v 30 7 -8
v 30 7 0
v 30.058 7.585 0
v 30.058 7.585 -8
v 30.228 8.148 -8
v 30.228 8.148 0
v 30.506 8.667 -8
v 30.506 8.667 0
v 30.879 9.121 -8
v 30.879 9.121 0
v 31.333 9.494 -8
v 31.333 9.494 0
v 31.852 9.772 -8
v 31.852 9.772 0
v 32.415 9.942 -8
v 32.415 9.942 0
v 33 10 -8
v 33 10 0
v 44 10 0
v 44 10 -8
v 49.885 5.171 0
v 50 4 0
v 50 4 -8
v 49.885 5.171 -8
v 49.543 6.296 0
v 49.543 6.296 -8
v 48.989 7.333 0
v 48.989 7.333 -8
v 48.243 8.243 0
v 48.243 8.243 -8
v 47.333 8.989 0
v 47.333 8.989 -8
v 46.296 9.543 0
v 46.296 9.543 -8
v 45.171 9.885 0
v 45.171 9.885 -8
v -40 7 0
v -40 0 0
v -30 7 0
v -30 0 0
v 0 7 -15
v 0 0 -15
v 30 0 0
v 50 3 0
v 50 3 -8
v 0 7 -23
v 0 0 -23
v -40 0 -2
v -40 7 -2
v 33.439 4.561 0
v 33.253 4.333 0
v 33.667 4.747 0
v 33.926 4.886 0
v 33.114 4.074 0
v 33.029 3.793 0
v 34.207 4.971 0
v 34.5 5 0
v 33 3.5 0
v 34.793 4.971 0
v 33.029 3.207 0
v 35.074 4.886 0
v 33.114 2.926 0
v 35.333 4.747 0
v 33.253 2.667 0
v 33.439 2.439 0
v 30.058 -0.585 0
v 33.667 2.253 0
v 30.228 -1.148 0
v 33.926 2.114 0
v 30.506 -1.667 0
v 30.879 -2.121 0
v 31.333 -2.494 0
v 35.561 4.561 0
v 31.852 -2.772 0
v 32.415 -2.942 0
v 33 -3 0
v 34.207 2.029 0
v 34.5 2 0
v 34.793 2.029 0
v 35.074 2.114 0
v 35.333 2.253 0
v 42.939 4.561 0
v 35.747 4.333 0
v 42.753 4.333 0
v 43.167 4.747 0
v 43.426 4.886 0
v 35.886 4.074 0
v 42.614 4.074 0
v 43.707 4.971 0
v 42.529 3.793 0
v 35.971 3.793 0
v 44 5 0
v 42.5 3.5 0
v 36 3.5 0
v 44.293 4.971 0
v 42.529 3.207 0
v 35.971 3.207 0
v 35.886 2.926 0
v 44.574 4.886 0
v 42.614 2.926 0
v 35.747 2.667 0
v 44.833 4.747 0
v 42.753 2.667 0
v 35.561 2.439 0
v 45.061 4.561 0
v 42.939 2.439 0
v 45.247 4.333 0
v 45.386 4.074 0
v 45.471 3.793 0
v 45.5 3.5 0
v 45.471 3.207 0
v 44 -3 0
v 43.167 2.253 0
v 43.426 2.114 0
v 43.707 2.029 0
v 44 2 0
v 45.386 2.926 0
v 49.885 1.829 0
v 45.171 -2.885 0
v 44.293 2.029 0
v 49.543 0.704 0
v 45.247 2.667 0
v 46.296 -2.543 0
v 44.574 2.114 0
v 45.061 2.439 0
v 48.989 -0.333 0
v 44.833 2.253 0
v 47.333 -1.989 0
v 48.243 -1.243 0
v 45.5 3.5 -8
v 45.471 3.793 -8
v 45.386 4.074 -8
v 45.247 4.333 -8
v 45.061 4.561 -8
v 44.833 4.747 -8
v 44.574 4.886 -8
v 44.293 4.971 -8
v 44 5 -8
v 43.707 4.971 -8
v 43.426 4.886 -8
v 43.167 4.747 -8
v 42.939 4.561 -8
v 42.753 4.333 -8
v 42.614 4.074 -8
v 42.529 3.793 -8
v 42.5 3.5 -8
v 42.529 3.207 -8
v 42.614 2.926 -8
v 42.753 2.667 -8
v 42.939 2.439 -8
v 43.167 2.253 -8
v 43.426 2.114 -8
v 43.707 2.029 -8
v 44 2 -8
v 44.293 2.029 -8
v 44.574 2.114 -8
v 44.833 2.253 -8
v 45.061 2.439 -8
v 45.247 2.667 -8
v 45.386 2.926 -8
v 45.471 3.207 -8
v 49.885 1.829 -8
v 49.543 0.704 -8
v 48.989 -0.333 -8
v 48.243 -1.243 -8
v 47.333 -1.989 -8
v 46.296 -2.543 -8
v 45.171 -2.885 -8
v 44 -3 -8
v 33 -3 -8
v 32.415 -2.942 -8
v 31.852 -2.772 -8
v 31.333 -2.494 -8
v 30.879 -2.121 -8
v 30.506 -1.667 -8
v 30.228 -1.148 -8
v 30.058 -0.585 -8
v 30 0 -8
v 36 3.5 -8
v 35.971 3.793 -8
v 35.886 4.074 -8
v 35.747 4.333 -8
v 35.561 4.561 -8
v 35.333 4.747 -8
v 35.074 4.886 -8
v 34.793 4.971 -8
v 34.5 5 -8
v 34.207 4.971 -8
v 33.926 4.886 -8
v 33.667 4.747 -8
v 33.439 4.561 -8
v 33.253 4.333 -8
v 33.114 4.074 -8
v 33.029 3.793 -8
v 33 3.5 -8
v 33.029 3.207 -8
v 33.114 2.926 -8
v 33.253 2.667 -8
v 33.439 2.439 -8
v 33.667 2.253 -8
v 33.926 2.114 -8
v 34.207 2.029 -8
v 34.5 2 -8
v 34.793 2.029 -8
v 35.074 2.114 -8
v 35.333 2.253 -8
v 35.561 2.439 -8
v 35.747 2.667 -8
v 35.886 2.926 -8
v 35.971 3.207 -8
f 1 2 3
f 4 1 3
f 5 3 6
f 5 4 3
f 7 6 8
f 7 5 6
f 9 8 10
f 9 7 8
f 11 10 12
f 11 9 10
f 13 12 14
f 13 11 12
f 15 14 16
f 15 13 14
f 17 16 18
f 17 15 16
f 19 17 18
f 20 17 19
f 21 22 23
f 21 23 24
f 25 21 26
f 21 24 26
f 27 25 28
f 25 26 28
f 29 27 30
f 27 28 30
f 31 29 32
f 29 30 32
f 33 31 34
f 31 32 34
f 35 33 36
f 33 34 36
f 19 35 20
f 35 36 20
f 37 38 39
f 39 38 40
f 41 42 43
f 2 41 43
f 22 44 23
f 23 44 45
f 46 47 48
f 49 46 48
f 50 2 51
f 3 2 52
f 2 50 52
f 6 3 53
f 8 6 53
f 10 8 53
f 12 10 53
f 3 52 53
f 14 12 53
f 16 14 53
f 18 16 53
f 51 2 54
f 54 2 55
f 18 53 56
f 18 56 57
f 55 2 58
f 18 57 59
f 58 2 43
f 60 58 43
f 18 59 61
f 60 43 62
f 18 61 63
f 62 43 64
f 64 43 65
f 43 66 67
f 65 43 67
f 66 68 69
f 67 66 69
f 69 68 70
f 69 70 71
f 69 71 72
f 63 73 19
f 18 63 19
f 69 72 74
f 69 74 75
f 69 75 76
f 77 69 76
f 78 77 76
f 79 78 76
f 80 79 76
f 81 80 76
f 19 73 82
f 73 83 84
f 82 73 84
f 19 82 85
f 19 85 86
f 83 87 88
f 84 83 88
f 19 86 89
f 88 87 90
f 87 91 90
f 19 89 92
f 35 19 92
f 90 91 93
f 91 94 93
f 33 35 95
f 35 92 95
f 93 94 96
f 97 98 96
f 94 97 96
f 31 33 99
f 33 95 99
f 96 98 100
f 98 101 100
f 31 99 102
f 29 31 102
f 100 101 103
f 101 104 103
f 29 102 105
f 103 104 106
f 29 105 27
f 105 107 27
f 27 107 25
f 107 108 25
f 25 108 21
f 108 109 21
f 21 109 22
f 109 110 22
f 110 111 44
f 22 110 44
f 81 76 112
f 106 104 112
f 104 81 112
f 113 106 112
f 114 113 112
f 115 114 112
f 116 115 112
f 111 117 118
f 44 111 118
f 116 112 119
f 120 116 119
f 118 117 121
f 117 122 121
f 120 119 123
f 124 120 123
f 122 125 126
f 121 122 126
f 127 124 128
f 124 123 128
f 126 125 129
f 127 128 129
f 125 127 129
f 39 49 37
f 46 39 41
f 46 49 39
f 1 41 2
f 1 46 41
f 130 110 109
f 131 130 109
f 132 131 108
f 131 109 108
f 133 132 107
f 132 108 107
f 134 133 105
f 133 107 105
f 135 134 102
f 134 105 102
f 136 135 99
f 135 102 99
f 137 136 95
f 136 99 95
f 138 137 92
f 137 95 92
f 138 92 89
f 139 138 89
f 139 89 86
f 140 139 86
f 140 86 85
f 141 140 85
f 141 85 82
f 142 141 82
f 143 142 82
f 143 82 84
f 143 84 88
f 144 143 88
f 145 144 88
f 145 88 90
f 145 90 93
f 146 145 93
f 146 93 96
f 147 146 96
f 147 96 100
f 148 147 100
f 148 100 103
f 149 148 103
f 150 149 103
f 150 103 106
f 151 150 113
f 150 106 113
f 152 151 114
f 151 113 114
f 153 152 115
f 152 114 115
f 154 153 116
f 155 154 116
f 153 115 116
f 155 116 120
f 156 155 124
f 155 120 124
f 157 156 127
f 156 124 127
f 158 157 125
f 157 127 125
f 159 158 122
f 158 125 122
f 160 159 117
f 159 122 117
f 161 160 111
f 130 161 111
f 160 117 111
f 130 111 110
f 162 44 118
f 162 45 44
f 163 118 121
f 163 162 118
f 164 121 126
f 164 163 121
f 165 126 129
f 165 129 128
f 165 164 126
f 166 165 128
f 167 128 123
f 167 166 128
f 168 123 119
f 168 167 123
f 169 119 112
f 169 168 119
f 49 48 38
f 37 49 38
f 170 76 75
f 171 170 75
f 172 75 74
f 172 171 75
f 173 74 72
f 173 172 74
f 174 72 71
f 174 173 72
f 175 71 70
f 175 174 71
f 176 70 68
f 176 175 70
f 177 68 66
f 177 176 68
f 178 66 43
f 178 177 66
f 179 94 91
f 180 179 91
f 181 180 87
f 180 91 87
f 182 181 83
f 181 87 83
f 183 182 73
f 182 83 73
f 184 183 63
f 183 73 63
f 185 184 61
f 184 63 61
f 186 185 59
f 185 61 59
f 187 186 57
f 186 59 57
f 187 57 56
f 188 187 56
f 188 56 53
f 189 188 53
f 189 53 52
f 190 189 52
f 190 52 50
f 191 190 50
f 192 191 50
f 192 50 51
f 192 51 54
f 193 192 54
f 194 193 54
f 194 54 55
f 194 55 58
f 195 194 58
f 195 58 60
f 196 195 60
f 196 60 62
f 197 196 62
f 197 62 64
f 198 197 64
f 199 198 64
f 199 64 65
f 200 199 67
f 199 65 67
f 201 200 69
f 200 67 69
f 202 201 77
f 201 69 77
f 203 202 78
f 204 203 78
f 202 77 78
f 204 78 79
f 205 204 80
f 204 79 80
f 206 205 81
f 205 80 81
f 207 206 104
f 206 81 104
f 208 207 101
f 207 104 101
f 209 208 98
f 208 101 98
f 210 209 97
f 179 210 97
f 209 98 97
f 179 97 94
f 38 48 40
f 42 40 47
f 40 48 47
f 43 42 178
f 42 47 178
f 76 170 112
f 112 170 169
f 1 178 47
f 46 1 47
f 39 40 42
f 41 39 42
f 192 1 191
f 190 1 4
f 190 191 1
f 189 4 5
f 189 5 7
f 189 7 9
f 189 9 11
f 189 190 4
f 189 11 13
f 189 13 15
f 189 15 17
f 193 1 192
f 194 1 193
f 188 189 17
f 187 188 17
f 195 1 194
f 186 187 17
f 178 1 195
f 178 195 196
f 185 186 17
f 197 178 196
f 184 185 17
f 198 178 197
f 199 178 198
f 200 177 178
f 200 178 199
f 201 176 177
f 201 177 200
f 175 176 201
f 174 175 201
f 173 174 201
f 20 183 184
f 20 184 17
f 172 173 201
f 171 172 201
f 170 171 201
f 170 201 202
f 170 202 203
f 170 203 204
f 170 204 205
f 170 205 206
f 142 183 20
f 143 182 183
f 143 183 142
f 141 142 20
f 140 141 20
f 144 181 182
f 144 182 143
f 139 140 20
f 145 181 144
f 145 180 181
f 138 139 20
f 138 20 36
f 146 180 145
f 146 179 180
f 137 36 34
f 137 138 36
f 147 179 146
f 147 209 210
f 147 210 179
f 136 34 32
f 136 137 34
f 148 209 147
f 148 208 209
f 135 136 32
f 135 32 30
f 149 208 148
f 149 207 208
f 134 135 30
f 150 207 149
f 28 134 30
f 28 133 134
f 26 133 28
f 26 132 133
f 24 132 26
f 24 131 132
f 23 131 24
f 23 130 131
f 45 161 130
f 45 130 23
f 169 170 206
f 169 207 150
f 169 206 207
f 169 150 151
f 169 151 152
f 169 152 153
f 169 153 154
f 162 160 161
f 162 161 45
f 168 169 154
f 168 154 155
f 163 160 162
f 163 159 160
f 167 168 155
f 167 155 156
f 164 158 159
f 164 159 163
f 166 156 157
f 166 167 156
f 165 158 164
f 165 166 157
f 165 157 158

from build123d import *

# Parameters (mm, degrees)
BOSS_EXTRUDE1_DEPTH      = 7
BOSS_EXTRUDE2_DEPTH      = 3
BOSS_EXTRUDE2_DEPTH_BACK = 10
SKETCH2_W                = 20
SKETCH2_H                = 8
FILLET1_R                = 6
FILLET2_R                = 3
F_3_0_3_DIAMETER_HOLE1_D = 3


with BuildPart() as part:
    # Sketch1 → Boss-Extrude1 (new body)
    with BuildSketch(Plane(origin=(0, 0, 0), x_dir=(1, 0, 0), z_dir=(0, 1, 0))):
        Polygon((50, 0), (50, 8), (30, 8), (0, 23), (-40, 2), (-40, 0), (-30, 0), (0, 15), (30, 0), align=None)
    extrude(amount=BOSS_EXTRUDE1_DEPTH)

    # Sketch2 → Boss-Extrude2 (add, two sides: drawn at the far end of the back side and taken through both)
    with BuildSketch(Plane(origin=(0, 7, 0), x_dir=(1, 0, 0), z_dir=(0, 1, 0)).offset(-BOSS_EXTRUDE2_DEPTH_BACK)):
        with Locations((40, 4)):
            Rectangle(SKETCH2_W, SKETCH2_H)
    extrude(amount=BOSS_EXTRUDE2_DEPTH + BOSS_EXTRUDE2_DEPTH_BACK)

    # Fillet1
    fillet1_edges = [part.edges().sort_by_distance(p)[0] for p in [
        (50, -3, -4),
        (50, 10, -4),
    ]]
    fillet(fillet1_edges, radius=FILLET1_R)

    # Fillet2
    fillet2_edges = [part.edges().sort_by_distance(p)[0] for p in [
        (30, -3, -4),
        (30, 10, -4),
    ]]
    fillet(fillet2_edges, radius=FILLET2_R - 0.0001)  # a hair under: the kernel refuses the full size

    # Ø3.0 (3) Diameter Hole1 (through all)
    with Locations(Plane(origin=(0, 0, -8), x_dir=(-1, 0, 0), z_dir=(0, 0, -1))):
        with Locations((-44, 3.5), (-34.5, 3.5)):
            Hole(F_3_0_3_DIAMETER_HOLE1_D / 2)


solid = part.part
